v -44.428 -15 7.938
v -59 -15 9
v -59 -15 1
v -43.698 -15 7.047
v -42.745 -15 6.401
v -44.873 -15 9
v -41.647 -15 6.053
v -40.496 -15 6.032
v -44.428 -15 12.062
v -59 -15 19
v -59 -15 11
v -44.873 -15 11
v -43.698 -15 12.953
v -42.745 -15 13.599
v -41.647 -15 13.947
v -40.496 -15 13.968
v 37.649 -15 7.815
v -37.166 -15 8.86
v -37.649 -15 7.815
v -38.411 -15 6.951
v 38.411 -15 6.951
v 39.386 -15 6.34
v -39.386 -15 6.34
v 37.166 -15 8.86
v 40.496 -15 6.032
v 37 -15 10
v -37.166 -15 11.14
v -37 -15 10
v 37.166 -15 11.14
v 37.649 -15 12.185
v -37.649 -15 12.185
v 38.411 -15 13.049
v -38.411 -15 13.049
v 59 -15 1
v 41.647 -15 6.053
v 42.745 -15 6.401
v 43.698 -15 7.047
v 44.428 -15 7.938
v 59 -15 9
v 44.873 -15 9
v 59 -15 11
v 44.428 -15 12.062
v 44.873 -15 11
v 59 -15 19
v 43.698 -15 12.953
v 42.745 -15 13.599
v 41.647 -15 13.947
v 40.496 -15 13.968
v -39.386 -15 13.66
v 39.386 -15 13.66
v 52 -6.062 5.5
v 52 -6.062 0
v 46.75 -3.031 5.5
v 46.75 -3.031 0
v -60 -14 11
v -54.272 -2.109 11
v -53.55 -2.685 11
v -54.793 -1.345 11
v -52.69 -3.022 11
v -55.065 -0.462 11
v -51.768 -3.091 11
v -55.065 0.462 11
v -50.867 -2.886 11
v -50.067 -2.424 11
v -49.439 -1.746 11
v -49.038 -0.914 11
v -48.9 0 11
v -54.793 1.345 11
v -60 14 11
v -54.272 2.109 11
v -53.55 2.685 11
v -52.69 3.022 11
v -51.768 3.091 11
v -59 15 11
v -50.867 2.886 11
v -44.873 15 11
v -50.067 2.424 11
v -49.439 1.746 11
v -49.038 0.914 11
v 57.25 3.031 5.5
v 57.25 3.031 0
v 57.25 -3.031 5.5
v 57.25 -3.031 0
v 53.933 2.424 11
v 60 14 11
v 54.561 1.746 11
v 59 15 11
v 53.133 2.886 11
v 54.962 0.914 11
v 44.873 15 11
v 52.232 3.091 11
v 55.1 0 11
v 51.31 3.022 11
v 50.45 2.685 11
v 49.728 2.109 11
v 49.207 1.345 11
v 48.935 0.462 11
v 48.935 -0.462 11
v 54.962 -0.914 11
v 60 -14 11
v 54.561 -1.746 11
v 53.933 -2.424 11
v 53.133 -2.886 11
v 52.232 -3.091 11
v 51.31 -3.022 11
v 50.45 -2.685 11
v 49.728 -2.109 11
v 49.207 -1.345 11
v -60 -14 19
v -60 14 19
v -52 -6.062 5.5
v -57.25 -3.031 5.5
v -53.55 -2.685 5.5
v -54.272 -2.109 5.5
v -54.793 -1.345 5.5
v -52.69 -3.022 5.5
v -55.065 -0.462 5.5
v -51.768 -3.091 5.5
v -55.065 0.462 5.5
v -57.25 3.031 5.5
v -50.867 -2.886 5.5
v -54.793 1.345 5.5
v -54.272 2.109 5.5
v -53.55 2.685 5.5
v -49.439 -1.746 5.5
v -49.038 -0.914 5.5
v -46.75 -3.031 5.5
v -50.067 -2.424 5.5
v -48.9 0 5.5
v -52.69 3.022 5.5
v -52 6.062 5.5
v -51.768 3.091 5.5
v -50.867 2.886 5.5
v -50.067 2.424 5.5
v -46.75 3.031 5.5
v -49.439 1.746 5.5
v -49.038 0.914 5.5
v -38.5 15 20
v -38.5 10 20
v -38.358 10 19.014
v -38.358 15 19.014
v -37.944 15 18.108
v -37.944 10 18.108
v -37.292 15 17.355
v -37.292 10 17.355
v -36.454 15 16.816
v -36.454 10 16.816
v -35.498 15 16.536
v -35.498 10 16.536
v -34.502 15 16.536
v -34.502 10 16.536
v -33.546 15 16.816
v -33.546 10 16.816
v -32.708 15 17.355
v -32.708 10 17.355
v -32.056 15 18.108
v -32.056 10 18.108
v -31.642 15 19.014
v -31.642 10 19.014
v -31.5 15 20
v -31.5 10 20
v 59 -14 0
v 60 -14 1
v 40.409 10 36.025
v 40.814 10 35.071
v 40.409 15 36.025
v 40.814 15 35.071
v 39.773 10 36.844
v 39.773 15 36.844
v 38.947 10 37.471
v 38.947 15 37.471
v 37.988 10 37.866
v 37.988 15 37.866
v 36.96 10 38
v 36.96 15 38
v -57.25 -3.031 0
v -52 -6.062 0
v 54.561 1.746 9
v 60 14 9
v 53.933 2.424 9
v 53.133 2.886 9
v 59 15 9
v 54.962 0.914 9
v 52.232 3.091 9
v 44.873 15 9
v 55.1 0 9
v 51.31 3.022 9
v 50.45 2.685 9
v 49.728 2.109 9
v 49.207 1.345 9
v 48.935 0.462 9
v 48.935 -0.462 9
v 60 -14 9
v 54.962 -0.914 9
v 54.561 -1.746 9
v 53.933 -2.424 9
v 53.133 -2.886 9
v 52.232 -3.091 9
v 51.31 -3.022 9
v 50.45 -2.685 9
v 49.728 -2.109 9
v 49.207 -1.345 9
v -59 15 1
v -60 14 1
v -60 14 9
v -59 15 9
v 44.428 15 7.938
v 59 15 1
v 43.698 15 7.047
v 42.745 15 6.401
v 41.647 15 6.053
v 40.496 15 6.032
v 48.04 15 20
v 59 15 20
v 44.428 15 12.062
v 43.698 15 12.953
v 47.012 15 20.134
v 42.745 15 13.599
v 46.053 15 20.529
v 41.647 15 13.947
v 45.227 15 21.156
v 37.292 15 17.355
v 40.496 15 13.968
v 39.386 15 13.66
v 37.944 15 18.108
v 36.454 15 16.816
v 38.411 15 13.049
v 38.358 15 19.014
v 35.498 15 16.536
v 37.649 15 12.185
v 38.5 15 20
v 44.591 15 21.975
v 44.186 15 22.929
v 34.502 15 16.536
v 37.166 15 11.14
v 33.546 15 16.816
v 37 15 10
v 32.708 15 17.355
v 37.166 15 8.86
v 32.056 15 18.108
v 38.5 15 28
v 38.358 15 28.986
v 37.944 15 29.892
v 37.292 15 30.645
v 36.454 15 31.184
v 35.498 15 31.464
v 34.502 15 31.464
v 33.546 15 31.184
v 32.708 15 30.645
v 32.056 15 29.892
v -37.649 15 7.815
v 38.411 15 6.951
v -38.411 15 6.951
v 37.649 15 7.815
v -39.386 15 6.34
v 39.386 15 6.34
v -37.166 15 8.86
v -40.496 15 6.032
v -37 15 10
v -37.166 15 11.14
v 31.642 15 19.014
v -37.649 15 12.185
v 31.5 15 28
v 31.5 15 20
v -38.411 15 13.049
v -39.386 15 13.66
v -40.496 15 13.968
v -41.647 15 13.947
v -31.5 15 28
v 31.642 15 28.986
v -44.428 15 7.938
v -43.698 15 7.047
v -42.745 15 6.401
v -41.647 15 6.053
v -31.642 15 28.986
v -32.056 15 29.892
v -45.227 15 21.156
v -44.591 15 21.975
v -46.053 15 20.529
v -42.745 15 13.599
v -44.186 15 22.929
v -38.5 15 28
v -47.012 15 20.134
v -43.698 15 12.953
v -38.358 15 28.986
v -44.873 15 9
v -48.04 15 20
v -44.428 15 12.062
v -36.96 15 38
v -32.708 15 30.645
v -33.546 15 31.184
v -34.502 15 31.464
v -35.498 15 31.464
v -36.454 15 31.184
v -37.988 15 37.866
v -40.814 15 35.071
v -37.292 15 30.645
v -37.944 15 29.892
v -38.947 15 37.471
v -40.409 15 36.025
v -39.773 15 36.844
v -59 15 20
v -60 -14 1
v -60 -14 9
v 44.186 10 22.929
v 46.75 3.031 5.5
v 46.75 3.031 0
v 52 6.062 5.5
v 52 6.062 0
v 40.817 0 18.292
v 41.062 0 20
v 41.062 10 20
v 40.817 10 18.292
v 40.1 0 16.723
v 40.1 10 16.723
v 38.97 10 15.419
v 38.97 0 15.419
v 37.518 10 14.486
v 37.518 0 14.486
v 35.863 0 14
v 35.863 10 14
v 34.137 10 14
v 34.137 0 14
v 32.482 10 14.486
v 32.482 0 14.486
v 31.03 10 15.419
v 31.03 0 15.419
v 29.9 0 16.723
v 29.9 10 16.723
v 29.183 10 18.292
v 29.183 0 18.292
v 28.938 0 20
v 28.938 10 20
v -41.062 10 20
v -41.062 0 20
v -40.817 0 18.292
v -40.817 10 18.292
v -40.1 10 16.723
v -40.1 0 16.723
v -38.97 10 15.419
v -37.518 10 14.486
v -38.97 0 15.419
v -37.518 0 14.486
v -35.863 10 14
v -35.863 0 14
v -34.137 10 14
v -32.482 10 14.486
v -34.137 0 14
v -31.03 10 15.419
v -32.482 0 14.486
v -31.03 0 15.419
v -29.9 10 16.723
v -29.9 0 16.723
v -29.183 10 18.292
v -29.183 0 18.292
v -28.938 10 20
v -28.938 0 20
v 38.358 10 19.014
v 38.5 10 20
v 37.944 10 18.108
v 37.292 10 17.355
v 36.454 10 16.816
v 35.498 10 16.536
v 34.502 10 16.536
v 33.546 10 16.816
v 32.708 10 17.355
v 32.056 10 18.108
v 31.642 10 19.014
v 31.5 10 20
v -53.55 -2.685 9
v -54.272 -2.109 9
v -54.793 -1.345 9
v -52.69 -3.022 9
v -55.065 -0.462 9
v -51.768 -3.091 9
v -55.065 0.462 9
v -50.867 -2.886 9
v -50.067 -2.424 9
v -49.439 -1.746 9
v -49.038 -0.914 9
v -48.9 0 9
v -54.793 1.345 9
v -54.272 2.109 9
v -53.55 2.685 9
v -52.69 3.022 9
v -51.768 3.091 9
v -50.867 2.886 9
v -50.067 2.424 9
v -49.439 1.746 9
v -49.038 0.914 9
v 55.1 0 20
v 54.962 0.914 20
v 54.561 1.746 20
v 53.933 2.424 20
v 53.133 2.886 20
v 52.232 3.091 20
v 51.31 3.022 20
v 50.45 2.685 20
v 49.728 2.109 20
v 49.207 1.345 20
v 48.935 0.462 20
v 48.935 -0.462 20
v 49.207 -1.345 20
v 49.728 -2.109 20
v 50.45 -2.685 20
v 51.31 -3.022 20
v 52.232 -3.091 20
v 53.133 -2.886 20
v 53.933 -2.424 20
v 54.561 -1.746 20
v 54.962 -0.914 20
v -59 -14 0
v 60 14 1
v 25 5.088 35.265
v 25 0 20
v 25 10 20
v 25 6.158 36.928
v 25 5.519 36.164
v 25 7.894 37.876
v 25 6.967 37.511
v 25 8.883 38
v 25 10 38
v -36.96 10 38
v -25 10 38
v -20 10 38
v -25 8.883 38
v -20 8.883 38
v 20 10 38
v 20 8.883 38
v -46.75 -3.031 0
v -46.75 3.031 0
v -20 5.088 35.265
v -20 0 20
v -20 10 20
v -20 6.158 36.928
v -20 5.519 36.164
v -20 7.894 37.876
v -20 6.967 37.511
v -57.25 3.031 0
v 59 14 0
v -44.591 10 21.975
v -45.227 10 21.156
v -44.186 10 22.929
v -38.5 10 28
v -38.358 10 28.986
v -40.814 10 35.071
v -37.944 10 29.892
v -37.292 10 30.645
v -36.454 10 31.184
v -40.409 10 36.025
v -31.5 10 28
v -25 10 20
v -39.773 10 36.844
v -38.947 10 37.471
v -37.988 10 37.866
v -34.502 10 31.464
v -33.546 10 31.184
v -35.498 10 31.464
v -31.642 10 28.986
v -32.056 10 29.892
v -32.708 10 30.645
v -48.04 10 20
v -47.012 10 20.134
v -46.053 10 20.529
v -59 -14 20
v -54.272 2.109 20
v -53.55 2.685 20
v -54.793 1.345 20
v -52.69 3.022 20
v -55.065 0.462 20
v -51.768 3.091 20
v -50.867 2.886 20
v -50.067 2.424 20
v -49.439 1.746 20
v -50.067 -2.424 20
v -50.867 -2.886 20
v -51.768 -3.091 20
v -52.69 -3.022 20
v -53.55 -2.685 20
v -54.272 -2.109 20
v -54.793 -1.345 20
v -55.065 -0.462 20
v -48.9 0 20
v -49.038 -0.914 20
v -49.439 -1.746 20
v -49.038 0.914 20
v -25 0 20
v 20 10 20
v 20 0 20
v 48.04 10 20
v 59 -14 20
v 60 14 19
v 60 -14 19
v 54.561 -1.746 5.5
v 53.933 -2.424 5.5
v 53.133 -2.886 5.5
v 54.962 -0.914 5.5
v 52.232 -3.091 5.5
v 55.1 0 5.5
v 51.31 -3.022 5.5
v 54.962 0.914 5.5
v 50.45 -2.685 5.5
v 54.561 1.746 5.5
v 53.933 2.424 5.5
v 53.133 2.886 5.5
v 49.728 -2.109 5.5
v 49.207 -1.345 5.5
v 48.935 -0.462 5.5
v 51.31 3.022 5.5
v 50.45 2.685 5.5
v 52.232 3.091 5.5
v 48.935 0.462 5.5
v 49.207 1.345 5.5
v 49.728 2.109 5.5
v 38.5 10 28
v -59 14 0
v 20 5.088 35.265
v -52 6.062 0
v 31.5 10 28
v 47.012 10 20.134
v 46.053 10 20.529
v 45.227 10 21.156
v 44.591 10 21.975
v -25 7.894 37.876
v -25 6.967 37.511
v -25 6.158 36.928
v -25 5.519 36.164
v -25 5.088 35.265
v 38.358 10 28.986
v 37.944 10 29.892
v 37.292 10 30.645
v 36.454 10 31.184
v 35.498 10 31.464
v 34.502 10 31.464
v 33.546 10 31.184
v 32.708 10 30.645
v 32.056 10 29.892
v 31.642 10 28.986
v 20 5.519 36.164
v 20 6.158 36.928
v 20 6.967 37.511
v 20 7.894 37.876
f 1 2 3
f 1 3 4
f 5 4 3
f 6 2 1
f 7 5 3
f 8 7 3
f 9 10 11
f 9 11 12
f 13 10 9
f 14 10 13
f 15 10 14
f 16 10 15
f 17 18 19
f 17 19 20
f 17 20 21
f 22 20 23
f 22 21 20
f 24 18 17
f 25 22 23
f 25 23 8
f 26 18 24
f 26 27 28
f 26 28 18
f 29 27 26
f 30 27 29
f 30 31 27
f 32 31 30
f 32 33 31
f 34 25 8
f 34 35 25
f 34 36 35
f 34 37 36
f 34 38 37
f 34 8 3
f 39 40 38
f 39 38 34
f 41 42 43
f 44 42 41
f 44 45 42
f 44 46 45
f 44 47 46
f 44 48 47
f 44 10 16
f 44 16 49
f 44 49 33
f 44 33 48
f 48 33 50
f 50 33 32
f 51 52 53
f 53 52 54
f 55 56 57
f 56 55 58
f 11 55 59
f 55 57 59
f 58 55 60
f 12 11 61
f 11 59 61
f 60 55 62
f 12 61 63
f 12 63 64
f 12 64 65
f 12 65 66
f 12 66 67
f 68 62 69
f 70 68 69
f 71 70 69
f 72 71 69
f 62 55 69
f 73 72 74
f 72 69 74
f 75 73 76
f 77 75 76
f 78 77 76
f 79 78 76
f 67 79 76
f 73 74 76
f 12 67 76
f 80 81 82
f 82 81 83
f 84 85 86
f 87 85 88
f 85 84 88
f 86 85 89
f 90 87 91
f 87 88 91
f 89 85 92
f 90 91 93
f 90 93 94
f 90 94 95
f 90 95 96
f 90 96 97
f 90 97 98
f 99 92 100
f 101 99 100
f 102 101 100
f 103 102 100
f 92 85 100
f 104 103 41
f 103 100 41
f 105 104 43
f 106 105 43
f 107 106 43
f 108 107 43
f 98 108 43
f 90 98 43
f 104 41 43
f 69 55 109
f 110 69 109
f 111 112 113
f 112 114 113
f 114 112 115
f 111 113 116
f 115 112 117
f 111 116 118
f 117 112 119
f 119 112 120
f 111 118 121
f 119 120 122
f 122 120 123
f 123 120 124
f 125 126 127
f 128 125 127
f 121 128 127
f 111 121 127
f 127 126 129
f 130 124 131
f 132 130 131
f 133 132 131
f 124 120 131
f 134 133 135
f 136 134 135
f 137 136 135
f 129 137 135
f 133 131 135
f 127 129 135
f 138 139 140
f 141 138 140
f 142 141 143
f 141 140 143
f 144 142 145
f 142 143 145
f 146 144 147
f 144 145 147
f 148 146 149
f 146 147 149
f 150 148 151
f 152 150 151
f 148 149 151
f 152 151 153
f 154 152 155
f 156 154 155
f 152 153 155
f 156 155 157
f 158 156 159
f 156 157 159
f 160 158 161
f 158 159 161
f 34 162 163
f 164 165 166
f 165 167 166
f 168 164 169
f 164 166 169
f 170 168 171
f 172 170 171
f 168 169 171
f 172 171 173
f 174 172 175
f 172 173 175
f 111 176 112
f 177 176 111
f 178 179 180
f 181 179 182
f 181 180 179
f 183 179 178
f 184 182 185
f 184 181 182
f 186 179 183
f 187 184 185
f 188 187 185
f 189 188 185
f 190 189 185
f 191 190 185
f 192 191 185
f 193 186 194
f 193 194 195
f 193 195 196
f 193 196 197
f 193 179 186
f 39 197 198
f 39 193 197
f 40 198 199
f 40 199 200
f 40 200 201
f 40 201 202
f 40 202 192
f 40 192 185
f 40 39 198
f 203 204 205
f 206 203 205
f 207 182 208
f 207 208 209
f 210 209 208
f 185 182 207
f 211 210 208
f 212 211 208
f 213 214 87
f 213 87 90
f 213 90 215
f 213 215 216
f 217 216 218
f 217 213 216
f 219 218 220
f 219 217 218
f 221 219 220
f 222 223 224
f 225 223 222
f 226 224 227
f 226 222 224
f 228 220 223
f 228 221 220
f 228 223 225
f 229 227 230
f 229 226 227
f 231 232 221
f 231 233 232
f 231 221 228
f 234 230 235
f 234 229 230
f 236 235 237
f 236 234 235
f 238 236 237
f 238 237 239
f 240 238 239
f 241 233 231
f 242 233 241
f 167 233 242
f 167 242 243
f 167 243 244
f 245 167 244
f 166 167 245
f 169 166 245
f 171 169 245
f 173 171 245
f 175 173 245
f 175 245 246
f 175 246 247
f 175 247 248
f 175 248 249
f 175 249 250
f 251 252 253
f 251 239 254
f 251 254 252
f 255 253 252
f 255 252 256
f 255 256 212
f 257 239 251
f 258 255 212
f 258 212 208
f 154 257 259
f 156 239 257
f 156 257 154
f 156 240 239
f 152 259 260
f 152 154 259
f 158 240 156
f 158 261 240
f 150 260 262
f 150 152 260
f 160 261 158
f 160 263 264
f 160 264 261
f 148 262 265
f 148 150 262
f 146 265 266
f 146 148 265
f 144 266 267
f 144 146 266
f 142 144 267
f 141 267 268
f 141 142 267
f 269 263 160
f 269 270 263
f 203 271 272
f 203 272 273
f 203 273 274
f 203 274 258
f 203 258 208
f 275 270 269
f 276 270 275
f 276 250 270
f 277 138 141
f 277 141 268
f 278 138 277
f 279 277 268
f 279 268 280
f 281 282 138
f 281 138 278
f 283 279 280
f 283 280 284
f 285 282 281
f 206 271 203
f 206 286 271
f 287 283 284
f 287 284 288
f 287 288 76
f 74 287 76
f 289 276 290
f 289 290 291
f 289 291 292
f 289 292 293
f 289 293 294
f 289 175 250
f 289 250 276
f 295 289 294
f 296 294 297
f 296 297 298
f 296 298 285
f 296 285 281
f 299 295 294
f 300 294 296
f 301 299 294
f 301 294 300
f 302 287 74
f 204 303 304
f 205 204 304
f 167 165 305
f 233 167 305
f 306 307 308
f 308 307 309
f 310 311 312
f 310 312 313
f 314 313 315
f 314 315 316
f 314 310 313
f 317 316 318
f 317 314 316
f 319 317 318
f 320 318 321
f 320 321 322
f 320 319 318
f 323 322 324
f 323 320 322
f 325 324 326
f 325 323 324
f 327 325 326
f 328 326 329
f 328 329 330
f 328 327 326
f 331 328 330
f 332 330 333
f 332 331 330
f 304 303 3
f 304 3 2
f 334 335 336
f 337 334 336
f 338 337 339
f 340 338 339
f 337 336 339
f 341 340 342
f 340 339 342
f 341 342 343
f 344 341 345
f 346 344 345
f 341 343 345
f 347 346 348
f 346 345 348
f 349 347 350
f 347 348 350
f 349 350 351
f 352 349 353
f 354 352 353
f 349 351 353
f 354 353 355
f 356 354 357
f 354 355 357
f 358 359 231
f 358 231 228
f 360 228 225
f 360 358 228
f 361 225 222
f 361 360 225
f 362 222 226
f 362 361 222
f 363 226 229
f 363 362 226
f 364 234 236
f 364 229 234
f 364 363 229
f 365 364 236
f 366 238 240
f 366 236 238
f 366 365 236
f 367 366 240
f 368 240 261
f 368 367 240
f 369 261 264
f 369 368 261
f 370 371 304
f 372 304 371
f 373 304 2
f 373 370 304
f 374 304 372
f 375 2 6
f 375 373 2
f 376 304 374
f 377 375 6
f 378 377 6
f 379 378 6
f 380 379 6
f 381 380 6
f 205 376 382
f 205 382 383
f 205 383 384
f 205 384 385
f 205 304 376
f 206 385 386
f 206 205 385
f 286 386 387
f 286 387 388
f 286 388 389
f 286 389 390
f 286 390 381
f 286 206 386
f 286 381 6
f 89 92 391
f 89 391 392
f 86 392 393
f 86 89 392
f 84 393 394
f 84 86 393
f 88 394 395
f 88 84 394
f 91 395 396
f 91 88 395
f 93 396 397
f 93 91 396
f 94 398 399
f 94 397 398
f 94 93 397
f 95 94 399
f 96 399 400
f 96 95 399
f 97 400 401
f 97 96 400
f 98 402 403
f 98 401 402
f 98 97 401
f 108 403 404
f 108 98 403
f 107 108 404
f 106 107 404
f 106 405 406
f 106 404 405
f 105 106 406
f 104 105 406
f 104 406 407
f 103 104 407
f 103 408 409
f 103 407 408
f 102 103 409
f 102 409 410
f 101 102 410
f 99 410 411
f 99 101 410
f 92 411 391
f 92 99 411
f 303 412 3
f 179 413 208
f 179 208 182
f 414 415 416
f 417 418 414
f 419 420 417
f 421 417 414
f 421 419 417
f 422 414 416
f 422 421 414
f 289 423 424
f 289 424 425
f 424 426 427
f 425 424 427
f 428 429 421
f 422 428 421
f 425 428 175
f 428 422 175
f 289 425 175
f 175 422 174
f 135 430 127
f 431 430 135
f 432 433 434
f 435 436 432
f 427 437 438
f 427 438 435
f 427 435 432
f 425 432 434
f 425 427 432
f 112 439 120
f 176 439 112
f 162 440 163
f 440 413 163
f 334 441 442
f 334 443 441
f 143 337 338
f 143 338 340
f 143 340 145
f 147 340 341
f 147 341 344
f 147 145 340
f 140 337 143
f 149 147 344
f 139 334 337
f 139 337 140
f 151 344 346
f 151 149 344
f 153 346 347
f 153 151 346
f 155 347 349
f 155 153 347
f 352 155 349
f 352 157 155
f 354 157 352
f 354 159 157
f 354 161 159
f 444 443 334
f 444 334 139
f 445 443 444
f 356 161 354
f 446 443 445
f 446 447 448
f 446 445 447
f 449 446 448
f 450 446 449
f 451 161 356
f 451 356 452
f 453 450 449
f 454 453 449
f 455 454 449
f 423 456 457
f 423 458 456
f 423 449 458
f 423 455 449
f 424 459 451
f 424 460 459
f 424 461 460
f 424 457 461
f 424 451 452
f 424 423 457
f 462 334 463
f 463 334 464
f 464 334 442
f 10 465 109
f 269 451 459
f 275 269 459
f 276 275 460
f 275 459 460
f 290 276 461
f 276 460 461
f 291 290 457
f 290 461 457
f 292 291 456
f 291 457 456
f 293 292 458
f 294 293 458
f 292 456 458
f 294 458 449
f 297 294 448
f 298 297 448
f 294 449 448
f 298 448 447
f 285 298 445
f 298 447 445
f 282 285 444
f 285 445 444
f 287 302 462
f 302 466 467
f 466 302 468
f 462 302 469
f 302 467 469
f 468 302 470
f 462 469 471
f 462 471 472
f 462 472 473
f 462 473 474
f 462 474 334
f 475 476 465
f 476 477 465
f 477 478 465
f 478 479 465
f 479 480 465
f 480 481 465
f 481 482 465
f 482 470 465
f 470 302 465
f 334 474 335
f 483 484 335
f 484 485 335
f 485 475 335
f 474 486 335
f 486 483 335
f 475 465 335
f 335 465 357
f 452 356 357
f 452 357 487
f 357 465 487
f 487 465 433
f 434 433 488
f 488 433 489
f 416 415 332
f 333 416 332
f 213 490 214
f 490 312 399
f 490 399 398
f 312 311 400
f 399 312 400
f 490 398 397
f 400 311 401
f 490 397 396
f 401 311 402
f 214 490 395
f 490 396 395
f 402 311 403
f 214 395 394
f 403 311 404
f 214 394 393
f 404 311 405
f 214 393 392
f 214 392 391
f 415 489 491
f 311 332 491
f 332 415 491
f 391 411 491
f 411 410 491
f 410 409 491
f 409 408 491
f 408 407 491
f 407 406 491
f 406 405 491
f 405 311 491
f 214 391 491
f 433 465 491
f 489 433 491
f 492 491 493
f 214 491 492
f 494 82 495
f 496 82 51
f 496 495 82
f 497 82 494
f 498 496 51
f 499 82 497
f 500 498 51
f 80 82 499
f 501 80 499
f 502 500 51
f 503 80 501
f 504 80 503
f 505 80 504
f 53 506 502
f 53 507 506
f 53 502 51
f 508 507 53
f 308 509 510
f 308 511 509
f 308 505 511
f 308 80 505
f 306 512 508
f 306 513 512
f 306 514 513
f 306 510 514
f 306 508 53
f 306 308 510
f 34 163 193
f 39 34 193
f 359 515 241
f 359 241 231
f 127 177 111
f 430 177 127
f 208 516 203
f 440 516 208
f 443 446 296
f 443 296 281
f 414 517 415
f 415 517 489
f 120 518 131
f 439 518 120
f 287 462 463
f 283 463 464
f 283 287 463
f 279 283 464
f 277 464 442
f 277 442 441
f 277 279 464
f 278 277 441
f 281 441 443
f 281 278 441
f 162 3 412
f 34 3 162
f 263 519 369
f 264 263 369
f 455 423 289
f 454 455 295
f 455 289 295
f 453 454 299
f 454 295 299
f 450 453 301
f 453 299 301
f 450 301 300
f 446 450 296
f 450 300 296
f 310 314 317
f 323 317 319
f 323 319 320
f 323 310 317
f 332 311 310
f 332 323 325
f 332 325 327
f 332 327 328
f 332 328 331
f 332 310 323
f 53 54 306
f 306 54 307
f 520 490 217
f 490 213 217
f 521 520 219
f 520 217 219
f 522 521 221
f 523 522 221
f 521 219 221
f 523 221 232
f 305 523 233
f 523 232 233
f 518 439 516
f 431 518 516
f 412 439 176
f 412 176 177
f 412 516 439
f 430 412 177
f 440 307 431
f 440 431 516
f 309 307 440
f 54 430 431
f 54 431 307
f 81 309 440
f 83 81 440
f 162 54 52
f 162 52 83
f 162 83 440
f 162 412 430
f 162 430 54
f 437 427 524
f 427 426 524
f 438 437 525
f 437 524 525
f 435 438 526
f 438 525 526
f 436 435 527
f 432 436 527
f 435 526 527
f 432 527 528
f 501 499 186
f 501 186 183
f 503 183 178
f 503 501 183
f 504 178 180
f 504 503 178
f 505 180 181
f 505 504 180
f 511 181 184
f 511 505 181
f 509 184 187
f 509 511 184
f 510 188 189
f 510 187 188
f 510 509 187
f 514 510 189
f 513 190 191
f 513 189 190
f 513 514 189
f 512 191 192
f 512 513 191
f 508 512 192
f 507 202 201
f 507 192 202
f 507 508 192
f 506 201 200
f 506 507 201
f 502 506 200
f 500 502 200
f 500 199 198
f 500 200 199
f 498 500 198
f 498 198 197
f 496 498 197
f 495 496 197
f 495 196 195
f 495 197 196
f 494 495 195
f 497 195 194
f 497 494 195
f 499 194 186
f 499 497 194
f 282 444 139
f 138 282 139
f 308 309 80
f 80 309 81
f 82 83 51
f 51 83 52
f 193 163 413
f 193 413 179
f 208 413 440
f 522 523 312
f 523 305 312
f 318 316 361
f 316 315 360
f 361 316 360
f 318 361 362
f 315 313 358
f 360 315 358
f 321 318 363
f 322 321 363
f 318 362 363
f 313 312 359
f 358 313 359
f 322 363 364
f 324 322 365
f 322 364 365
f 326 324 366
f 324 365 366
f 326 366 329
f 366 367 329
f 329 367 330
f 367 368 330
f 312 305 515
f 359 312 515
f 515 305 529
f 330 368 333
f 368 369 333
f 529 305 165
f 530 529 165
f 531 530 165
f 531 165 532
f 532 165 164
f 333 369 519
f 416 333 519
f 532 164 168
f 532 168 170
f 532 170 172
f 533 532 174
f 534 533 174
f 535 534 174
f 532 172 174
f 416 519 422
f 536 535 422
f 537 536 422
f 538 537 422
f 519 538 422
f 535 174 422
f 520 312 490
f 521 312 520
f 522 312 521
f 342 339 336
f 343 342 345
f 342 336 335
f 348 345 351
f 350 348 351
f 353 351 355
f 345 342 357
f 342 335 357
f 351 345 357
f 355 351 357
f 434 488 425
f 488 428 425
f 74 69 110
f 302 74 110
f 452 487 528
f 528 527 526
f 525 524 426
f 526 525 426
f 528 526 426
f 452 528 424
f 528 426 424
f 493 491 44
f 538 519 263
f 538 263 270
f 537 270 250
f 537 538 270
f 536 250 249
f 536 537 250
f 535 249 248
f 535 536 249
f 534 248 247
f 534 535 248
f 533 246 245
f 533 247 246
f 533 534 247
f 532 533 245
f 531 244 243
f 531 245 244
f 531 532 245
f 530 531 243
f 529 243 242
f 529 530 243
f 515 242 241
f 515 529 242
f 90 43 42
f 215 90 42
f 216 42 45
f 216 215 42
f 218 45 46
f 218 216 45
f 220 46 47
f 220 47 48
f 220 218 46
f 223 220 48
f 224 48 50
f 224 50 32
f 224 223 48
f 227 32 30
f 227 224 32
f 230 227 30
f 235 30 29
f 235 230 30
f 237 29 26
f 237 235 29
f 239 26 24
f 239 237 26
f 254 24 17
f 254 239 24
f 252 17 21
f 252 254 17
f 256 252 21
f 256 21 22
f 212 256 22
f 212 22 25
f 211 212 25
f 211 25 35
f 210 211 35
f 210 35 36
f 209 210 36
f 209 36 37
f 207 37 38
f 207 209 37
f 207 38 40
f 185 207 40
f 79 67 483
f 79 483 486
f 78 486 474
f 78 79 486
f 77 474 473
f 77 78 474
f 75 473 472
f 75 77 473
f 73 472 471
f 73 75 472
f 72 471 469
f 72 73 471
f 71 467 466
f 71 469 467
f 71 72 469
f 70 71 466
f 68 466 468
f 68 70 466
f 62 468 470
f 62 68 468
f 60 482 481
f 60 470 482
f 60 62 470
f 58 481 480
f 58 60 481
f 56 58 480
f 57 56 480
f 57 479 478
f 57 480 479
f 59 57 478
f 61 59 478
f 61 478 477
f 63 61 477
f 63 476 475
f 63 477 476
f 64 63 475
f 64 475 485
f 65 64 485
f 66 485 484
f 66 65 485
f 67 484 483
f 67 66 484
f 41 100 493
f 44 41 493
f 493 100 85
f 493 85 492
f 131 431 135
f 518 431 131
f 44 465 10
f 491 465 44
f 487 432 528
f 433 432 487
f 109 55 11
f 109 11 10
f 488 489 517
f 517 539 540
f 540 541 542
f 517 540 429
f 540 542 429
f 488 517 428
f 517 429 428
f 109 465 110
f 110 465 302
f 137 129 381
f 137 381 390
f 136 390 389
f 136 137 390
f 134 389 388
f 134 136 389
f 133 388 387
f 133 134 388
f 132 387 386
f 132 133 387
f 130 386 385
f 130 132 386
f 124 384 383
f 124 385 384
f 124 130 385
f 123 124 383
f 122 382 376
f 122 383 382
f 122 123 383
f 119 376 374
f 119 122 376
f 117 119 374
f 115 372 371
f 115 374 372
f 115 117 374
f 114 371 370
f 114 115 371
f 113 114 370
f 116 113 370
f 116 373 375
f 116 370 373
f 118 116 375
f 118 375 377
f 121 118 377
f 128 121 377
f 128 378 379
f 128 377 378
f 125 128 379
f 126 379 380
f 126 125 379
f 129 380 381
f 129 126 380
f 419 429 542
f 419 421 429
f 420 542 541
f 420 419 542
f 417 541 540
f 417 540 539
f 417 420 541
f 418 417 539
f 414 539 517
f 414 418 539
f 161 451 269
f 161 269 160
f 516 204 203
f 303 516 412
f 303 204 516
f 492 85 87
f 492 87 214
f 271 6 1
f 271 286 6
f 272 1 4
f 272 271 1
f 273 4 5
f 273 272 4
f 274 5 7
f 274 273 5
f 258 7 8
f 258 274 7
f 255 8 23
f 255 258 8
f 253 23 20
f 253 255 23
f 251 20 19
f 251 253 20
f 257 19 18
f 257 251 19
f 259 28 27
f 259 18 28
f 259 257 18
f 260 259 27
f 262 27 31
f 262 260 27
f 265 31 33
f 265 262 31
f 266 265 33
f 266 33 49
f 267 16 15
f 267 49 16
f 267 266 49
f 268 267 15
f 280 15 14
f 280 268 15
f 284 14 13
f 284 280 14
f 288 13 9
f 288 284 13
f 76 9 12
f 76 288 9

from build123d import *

# Parameters (mm, degrees)
SKETCH_W          = 120
SKETCH_H          = 20
SKETCH_R          = 4
PAD_DEPTH         = 15
SKETCH001_W       = 40
SKETCH001_H       = 2
POCKET_DEPTH      = 265.600282
POCKET_DEPTH_BACK = 265.600282
SKETCH002_R       = 3.1
HOLE_DEPTH        = 20.001
POCKET001_DEPTH   = 5.5
PAD001_START      = -10
PAD001_DEPTH      = 5
SKETCH006_R       = 6.062178
POCKET002_DEPTH   = 10
POCKET003_DEPTH   = 273.798218
PAD002_START      = -20
PAD002_DEPTH      = 5
CHAMFER_SIZE      = 1
FILLET_R          = 4


with BuildPart() as part:
    # Sketch → Pad (new body, symmetric)
    with BuildSketch(Plane.XZ):
        with Locations((0, 10)):
            Rectangle(SKETCH_W, SKETCH_H)
        with Locations((-41, 10)):
            Circle(SKETCH_R, mode=Mode.SUBTRACT)
        with Locations((41, 10)):
            Circle(SKETCH_R, mode=Mode.SUBTRACT)
    extrude(amount=PAD_DEPTH, both=True)

    # Sketch001 → Pocket (cut, two sides)
    with BuildSketch(Plane.XZ) as pocket_sk:
        with Locations((-60, 10)):
            Rectangle(SKETCH001_W, SKETCH001_H)
    pocket = extrude(amount=-POCKET_DEPTH, mode=Mode.SUBTRACT) + extrude(pocket_sk.sketch, amount=POCKET_DEPTH_BACK, mode=Mode.SUBTRACT)

    # Mirrored: Pocket across Sketch001 V_Axis
    add(pocket.mirror(Plane(origin=(0, 0, 0), x_dir=(0, -1, 0), z_dir=(1, 0, 0))), mode=Mode.SUBTRACT)

    # Sketch002 → Hole (cut, through all)
    with BuildSketch(Plane.XY):
        with Locations((-52, 0)):
            Circle(SKETCH002_R)
        with Locations((52, 0)):
            Circle(SKETCH002_R)
    extrude(amount=HOLE_DEPTH, mode=Mode.SUBTRACT)

    # Sketch003 → Pocket001 (cut)
    with BuildSketch(Plane.XY):
        Polygon((-46.75, 3.031089), (-52, 6.062178), (-57.25, 3.031089), (-57.25, -3.031089), (-52, -6.062178), (-46.75, -3.031089), align=None)
    pocket001 = extrude(amount=POCKET001_DEPTH, mode=Mode.SUBTRACT)

    # Mirrored001: Pocket001 across Sketch003 V_Axis
    add(pocket001.mirror(Plane(origin=(0, 0, 0), x_dir=(0, 0, 1), z_dir=(1, 0, 0))), mode=Mode.SUBTRACT)

    # Sketch005 → Pad001 (join)
    with BuildSketch(Plane.XZ.offset(PAD001_START)):
        Polygon((0, 38), (-40, 38), (-45, 20), (0, 20), align=None)
    pad001 = extrude(amount=-PAD001_DEPTH)

    # Sketch006 → Pocket002 (cut)
    with BuildSketch(Plane.XZ):
        with Locations((-35, 20)):
            Circle(SKETCH006_R)
    pocket002 = extrude(amount=-POCKET002_DEPTH, mode=Mode.SUBTRACT)

    # Sketch004 → Pocket003 (cut, through all)
    with BuildSketch(Plane.XZ):
        with BuildLine():
            ThreePointArc((-31.5, 28), (-35, 31.5), (-38.5, 28))
            Line((-38.5, 28), (-38.5, 20))
            ThreePointArc((-38.5, 20), (-35, 16.5), (-31.5, 20))
            Line((-31.5, 28), (-31.5, 20))
        make_face()
    pocket003 = extrude(amount=-POCKET003_DEPTH, mode=Mode.SUBTRACT)

    # Sketch007 → Pad002 (join)
    with BuildSketch(Plane.YZ.offset(PAD002_START)):
        Polygon((10, 38), (6, 38), (0, 20), (10, 20), align=None)
    pad002 = extrude(amount=-PAD002_DEPTH)

    # Mirrored002: Pad002, Pad001, Pocket002, Pocket003 across YZ
    add(pad002.mirror(Plane.YZ))
    add(pad001.mirror(Plane.YZ))
    add(pocket002.mirror(Plane.YZ), mode=Mode.SUBTRACT)
    add(pocket003.mirror(Plane.YZ), mode=Mode.SUBTRACT)

    # Chamfer
    chamfer_edges = [part.edges().sort_by_distance(p)[0] for p in [
        (60, 0, 20),
        (60, 0, 0),
        (-60, 0, 20),
        (-60, 0, 0),
        (0, -15, 20),
        (0, -15, 0),
        (-60, -15, 15.5),
        (-60, -15, 4.5),
        (-60, 15, 4.5),
        (-60, 15, 15.5),
        (60, -15, 15.5),
        (60, -15, 4.5),
        (60, 15, 15.5),
        (60, 15, 4.5),
        (0, 15, 0),
    ]]
    chamfer(chamfer_edges, length=CHAMFER_SIZE)

    # Fillet
    fillet_edges = [part.edges().sort_by_distance(p)[0] for p in [
        (45, 12.5, 20),
        (40, 12.5, 38),
        (-40, 12.5, 38),
        (-45, 12.5, 20),
        (22.5, 6, 38),
        (-22.5, 6, 38),
    ]]
    fillet(fillet_edges, radius=FILLET_R)


solid = part.part
